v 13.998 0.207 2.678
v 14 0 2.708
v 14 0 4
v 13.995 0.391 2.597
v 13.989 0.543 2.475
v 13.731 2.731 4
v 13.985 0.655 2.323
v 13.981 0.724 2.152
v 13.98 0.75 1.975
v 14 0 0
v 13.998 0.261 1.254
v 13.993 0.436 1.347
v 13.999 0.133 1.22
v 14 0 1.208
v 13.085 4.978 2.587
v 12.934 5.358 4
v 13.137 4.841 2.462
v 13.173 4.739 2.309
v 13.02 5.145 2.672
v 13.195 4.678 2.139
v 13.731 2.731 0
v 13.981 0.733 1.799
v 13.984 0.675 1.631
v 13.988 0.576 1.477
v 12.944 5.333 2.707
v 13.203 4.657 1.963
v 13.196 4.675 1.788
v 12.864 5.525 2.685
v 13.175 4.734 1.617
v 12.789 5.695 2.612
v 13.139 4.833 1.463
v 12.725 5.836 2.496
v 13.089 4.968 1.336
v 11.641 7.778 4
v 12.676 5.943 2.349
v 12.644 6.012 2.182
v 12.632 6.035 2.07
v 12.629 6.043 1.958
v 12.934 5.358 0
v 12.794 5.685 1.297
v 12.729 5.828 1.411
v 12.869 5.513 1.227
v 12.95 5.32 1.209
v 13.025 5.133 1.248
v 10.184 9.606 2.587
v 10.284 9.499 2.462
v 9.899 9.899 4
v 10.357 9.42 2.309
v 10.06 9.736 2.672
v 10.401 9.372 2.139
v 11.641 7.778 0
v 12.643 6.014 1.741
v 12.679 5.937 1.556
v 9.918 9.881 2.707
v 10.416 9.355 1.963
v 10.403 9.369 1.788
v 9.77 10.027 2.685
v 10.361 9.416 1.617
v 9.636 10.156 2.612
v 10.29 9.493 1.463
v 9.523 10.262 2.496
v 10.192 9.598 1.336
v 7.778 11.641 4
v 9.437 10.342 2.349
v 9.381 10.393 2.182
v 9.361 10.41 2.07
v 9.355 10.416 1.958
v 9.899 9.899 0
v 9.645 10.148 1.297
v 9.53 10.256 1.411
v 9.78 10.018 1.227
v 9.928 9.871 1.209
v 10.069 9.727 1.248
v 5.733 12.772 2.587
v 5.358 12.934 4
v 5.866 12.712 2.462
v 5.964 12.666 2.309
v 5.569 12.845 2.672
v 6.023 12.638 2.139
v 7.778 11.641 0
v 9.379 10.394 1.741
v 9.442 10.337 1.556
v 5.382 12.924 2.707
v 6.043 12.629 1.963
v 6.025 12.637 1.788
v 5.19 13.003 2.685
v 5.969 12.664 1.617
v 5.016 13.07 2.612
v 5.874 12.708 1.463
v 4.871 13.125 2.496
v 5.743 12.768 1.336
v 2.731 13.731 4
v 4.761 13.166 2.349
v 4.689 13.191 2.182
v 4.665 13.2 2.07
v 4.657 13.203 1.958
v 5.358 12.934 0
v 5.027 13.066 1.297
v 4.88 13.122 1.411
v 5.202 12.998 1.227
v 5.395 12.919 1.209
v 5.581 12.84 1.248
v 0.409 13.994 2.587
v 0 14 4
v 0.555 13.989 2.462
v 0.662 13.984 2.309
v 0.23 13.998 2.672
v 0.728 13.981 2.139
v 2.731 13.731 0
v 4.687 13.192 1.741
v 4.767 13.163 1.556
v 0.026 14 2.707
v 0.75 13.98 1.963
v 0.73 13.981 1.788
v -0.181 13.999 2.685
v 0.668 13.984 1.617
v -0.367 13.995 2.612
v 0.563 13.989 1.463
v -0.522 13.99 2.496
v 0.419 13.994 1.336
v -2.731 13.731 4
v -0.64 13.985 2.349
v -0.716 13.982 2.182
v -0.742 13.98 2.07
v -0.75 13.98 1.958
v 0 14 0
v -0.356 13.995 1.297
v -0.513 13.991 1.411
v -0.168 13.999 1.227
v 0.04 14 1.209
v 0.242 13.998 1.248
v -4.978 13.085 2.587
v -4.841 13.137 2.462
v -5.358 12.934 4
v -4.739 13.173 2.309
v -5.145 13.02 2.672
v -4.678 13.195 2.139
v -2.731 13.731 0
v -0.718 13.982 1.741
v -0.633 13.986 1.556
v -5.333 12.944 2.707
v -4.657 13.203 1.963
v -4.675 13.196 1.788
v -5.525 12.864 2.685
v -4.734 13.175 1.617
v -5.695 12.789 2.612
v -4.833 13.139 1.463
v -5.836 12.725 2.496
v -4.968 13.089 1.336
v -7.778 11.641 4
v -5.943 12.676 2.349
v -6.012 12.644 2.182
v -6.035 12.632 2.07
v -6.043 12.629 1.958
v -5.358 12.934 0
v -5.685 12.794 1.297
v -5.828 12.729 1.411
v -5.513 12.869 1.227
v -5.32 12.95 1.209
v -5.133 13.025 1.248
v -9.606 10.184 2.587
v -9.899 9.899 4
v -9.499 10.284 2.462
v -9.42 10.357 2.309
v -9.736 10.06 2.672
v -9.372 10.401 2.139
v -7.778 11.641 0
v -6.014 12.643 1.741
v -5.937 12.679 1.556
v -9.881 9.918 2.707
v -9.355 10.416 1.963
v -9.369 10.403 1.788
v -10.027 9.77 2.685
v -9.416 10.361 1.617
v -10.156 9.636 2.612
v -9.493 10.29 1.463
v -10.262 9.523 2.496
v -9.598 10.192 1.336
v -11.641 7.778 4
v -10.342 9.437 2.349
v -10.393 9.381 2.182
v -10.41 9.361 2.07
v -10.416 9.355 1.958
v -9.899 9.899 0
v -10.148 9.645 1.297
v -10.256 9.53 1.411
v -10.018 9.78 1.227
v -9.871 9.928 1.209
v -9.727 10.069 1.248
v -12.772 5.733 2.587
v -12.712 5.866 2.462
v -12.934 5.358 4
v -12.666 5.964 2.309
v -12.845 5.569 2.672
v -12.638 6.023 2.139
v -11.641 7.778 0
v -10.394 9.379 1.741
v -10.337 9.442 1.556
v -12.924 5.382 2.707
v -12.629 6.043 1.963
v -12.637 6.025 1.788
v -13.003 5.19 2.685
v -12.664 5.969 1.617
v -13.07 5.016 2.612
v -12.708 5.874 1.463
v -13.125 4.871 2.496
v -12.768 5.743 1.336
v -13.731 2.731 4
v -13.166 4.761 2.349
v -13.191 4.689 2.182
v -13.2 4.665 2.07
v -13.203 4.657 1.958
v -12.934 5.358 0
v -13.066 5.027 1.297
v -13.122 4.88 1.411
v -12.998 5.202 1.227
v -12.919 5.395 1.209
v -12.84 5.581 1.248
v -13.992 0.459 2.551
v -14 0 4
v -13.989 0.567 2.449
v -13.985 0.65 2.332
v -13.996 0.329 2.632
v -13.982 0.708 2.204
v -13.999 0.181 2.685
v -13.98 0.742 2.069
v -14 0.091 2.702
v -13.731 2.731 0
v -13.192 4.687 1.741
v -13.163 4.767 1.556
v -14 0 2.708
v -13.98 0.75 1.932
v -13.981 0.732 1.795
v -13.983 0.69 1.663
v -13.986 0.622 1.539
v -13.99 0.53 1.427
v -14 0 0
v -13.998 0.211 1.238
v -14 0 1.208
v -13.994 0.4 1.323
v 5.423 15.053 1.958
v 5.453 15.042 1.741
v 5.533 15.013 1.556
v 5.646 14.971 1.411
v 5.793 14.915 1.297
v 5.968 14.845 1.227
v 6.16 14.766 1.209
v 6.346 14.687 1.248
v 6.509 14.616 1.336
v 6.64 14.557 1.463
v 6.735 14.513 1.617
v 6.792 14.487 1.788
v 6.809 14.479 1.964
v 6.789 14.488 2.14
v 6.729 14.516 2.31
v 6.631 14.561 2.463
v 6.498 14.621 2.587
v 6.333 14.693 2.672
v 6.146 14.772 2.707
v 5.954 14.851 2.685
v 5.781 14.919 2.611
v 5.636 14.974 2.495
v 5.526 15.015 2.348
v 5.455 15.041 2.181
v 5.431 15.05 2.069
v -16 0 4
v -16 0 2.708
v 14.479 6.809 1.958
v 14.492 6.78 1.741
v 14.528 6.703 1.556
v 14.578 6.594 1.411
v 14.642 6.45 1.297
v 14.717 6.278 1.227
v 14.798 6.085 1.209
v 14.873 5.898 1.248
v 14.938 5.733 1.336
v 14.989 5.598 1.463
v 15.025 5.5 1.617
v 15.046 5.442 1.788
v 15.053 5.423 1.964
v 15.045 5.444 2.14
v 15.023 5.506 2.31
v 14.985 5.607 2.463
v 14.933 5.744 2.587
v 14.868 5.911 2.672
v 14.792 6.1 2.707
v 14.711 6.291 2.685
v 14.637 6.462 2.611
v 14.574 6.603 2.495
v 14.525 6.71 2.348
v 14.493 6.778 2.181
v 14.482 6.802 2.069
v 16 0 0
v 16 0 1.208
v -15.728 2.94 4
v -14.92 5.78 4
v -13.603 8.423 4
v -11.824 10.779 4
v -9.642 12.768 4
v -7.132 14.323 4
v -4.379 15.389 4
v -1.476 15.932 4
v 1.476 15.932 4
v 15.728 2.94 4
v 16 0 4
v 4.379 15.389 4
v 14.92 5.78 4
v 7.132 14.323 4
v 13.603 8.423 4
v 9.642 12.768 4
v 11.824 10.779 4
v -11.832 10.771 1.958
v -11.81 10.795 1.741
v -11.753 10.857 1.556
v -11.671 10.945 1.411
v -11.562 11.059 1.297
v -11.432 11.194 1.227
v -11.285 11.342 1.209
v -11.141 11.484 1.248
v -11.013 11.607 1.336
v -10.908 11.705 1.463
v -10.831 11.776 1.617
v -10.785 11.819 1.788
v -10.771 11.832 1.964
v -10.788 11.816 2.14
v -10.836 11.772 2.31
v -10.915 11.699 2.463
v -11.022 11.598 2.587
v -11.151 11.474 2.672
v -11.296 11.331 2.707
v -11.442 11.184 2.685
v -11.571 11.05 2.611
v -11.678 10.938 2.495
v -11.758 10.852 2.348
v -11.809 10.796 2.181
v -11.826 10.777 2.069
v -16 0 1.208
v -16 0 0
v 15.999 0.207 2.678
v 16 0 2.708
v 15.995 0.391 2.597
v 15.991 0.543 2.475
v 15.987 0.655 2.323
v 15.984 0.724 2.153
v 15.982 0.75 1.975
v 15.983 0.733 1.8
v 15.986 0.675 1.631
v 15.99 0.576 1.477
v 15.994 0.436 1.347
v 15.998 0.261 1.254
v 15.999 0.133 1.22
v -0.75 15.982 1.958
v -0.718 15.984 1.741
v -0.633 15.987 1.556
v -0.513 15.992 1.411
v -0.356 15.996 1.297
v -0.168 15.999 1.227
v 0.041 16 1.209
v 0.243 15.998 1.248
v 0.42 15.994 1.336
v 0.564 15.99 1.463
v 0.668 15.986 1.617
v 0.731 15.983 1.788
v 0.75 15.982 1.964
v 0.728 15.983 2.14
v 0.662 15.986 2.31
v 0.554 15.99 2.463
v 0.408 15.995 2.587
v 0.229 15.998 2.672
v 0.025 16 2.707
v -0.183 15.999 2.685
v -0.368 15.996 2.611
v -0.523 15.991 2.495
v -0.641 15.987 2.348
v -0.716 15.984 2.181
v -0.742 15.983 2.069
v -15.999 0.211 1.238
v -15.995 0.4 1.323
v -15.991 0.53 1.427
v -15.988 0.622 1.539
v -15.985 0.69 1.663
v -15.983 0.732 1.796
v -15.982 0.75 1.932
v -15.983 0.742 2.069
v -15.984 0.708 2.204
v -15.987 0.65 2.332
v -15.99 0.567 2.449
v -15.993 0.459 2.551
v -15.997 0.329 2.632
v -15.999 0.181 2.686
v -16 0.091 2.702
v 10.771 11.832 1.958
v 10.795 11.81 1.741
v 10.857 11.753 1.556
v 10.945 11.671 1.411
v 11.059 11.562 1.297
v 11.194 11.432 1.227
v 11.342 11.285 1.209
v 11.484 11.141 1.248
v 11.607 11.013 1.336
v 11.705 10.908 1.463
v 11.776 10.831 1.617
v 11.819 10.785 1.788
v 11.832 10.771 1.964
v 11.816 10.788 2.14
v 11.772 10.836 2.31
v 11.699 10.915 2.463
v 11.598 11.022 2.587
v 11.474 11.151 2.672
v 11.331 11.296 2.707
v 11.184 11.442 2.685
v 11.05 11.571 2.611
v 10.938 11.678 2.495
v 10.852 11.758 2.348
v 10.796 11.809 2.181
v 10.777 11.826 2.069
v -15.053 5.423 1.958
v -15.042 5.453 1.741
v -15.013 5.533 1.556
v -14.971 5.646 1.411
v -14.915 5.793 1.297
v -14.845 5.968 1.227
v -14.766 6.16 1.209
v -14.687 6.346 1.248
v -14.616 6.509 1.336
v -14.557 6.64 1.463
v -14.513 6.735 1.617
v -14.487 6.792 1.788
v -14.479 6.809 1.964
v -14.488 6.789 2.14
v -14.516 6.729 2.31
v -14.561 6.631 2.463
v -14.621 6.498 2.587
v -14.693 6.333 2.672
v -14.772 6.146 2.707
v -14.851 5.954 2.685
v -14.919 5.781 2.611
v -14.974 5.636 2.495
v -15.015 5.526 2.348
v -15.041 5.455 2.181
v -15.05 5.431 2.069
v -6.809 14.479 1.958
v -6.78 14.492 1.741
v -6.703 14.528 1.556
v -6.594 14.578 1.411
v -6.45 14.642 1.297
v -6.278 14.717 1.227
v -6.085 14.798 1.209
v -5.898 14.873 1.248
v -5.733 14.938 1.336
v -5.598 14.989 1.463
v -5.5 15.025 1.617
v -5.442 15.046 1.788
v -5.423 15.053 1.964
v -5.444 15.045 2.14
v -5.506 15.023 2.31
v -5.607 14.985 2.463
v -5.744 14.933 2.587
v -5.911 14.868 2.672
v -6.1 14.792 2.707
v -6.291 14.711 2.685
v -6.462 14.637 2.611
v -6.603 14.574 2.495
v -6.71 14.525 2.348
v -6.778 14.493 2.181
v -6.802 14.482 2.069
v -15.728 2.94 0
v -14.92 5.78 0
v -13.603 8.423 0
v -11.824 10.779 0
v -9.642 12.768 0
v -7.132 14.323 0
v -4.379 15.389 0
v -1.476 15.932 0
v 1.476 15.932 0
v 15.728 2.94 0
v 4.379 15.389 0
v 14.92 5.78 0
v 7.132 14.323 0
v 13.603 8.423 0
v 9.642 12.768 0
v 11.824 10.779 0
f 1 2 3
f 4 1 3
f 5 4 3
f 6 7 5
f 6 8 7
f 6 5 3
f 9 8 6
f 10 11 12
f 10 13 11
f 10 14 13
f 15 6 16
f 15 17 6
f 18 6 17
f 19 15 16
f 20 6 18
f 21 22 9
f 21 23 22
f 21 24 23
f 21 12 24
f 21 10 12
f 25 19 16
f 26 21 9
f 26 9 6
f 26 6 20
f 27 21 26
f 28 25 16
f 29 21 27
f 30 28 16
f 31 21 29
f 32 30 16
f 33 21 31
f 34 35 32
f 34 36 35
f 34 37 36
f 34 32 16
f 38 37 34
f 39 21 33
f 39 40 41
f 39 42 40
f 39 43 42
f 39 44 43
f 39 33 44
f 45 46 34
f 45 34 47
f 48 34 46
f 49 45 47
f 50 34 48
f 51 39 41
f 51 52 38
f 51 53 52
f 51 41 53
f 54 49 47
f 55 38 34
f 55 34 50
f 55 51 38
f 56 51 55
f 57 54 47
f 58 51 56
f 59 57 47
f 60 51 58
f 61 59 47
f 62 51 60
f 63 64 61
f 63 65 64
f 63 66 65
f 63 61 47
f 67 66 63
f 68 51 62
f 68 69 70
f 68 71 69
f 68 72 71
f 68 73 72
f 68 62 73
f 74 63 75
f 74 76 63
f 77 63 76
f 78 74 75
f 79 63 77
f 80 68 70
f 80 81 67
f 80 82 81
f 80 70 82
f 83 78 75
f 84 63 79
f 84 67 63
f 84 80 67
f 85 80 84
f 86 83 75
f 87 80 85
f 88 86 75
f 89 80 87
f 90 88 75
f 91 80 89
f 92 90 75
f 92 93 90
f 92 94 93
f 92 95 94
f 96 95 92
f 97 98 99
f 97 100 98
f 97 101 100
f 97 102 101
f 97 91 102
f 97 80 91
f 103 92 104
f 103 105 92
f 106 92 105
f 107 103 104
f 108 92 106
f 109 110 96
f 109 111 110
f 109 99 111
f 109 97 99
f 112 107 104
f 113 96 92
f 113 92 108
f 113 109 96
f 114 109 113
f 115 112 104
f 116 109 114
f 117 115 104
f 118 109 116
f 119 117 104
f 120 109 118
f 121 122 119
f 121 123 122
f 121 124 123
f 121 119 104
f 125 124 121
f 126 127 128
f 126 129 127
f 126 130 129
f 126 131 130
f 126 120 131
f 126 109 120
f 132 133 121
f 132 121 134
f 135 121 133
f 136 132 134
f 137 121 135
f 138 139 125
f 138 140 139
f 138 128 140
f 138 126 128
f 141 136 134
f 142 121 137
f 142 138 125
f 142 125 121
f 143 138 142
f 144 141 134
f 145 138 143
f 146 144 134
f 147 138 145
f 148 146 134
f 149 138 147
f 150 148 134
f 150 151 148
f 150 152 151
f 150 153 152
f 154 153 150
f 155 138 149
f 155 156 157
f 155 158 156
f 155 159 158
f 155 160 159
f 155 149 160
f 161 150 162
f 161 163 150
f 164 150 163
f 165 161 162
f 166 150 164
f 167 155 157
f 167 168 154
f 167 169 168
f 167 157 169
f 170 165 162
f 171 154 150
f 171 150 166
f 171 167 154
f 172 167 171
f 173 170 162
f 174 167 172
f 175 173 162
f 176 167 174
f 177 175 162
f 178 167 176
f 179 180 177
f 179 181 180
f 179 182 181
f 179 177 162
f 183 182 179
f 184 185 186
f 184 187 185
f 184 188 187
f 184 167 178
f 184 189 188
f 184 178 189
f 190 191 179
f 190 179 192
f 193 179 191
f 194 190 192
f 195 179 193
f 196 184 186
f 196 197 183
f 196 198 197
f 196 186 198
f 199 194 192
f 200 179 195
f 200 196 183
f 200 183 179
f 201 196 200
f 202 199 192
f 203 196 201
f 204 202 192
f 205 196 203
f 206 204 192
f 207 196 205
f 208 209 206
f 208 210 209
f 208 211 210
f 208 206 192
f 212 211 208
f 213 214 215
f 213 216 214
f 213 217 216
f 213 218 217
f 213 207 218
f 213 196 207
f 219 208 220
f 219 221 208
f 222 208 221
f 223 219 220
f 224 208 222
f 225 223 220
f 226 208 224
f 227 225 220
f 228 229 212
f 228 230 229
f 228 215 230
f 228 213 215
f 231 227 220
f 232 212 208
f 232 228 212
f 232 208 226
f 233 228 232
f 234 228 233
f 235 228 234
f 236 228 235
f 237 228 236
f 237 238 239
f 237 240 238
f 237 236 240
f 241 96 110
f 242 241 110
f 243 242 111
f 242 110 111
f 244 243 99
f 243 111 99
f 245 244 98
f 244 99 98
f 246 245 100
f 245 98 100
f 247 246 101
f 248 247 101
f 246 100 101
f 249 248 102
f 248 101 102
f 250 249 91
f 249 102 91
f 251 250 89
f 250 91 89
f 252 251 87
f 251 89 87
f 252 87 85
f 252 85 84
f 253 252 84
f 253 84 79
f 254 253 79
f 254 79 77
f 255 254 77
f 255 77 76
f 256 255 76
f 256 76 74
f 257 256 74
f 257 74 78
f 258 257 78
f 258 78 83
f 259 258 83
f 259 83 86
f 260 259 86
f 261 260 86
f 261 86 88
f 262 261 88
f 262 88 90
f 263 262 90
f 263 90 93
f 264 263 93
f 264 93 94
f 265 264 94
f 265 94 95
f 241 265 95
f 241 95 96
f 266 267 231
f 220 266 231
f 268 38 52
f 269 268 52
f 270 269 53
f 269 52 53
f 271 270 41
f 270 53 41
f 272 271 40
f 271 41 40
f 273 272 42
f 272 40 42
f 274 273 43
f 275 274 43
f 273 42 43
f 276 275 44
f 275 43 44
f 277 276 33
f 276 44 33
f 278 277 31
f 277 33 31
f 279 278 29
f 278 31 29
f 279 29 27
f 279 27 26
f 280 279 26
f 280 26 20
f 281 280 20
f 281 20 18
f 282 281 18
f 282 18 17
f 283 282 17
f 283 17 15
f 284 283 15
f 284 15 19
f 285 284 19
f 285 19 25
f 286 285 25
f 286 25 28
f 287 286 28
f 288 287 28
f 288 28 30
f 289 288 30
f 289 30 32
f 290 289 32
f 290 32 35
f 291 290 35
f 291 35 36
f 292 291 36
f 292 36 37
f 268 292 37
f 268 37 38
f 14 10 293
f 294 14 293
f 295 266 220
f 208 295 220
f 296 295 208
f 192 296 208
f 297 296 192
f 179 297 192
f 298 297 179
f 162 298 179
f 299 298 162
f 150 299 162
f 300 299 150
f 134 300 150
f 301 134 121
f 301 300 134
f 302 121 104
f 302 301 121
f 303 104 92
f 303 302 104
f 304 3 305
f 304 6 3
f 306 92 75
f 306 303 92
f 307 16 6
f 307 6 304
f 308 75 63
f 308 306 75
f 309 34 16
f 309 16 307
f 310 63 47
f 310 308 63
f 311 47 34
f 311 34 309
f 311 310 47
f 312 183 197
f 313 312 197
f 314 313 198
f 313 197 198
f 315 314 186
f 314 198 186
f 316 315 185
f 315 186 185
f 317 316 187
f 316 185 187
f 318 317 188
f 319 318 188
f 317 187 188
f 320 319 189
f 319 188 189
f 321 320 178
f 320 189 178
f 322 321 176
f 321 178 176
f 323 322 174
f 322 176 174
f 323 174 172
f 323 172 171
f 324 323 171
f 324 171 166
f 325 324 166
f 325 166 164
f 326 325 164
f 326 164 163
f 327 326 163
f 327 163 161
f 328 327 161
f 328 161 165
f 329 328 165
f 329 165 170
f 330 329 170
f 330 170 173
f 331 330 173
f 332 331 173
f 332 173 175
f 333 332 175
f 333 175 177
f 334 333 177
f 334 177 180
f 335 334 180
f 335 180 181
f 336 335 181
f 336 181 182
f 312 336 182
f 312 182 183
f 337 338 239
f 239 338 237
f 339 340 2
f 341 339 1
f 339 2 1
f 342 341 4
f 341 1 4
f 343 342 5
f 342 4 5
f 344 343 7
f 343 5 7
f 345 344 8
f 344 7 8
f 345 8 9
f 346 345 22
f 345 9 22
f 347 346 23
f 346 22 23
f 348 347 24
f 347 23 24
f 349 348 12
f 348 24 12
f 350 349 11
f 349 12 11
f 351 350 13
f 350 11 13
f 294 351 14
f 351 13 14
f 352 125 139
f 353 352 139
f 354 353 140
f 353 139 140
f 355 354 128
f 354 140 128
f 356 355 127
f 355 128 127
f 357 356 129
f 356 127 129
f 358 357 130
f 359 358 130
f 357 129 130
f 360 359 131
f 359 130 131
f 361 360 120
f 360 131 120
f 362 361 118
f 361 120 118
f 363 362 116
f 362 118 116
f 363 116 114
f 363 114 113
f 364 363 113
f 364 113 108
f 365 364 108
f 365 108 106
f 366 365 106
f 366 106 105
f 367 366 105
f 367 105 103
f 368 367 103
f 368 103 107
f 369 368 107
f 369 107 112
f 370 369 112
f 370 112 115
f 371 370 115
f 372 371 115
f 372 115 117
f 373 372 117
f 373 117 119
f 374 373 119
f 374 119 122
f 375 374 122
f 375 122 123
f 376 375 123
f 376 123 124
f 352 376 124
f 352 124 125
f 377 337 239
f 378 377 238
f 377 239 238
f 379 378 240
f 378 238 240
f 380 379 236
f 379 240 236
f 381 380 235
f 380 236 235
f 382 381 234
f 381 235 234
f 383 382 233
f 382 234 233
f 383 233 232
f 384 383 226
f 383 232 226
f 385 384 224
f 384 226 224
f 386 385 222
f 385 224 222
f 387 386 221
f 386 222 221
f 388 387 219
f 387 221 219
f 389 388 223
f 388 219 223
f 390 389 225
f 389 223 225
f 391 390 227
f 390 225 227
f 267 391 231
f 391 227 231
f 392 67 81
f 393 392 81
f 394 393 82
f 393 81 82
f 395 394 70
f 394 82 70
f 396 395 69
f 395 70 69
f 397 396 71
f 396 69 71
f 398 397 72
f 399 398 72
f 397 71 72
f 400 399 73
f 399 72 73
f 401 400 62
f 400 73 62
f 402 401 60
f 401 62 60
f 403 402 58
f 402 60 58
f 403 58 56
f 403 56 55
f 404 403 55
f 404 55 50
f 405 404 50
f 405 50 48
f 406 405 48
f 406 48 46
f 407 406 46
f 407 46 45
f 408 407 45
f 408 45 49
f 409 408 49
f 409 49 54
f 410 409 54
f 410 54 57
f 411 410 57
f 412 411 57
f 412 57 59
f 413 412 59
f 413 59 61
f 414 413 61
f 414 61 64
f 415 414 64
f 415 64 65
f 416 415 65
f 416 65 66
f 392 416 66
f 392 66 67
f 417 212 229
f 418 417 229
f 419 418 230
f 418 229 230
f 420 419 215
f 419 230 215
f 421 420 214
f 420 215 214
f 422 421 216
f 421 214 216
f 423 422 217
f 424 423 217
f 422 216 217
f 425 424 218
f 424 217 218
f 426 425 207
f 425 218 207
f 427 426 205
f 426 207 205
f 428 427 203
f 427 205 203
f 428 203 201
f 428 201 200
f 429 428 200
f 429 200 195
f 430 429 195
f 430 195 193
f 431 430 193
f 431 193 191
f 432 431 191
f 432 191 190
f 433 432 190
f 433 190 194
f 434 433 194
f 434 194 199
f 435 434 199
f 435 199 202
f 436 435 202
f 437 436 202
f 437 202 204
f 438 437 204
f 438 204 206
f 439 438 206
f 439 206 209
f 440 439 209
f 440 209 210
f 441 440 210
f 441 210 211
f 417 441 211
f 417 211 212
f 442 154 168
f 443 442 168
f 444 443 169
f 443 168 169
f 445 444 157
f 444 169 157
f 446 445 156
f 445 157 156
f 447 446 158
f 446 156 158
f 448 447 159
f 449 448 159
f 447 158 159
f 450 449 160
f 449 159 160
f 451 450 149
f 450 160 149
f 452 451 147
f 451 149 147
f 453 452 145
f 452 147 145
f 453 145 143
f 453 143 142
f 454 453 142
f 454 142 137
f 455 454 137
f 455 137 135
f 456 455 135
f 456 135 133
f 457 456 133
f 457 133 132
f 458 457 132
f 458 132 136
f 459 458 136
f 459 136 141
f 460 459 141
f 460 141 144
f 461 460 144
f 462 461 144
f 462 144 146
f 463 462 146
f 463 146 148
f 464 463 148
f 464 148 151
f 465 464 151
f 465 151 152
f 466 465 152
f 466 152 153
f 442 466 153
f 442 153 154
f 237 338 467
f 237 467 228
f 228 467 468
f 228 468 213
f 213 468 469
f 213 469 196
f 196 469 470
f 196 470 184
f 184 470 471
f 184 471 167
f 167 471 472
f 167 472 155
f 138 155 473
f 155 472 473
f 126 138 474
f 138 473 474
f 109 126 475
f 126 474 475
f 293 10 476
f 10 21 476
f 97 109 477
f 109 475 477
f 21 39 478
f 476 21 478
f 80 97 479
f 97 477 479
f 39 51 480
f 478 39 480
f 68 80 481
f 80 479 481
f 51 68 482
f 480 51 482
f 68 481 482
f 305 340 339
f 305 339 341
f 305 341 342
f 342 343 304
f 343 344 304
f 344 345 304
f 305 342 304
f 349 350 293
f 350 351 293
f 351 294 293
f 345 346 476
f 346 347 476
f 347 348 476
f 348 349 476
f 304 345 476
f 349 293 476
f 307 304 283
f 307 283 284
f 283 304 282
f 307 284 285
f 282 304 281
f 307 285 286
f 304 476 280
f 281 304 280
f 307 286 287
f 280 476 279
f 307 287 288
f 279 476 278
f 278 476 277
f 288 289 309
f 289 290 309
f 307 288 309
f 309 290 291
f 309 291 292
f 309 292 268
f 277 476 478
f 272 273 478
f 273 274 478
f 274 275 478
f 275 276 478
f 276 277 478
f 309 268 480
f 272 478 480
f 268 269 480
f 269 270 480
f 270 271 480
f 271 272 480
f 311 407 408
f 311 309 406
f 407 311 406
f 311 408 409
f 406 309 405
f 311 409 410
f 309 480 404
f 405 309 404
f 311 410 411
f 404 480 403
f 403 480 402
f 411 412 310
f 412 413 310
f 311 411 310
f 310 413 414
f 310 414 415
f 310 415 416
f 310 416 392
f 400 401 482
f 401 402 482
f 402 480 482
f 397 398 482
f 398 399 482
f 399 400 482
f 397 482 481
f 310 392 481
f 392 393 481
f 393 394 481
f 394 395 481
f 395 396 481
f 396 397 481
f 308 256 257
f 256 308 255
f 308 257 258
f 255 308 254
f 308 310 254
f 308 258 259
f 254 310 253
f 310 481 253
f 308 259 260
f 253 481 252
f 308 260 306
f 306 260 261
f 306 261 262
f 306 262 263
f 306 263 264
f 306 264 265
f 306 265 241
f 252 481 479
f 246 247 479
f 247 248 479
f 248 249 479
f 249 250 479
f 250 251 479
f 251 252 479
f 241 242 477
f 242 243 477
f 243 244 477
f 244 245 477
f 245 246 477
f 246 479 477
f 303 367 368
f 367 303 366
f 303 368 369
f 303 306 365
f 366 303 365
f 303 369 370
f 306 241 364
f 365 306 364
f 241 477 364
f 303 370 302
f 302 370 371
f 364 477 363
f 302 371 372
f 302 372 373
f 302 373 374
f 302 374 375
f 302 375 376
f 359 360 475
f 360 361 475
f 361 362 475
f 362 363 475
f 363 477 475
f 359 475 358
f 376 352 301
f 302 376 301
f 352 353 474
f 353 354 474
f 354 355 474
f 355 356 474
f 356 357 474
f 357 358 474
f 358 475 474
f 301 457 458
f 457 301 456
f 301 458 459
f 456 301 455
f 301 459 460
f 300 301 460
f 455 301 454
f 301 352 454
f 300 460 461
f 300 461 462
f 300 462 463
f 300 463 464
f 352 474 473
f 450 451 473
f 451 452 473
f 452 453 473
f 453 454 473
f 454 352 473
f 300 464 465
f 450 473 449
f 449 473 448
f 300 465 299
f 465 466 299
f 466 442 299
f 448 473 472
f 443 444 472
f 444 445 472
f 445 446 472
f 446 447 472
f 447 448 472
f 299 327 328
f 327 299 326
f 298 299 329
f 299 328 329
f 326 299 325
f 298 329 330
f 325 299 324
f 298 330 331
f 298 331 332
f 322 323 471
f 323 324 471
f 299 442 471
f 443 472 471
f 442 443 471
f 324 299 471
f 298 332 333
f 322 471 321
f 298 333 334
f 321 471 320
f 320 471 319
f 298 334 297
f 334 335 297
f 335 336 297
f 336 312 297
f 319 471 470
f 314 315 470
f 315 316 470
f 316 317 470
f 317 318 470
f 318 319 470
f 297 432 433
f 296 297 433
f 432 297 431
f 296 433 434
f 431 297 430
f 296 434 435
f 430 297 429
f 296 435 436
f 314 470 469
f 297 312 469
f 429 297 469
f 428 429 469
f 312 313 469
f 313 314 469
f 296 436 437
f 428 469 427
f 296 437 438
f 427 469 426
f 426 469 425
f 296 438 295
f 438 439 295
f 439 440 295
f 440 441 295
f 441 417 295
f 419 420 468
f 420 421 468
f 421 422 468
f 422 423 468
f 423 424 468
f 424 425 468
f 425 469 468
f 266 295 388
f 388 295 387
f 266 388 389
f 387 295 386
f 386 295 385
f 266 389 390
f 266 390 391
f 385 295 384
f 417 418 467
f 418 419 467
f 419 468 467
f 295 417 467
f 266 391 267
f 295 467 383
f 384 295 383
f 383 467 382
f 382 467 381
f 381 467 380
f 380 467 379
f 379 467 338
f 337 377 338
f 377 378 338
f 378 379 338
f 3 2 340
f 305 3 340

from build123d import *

# Parameters (mm, degrees)
SKETCH_1_R               = 16
SKETCH_1_R_2             = 14
EXTRUDE_1_DEPTH          = 4
SKETCH_2_R               = 0.75
CUT_EXTRUDE_1_DEPTH      = 17
PATTERN_CIRCULAR_1_COUNT = 16
SKETCH_3_W               = 36.79853237
SKETCH_3_H               = 11.94610836
CUT_EXTRUDE_2_DEPTH      = 17.0000001


with BuildPart() as part:
    # ｽｹｯﾁ1 → ﾎﾞｽ - 押し出し1 (new body)
    with BuildSketch(Plane.XY):
        Circle(SKETCH_1_R)
        Circle(SKETCH_1_R_2, mode=Mode.SUBTRACT)
    extrude(amount=EXTRUDE_1_DEPTH)

    # ｽｹｯﾁ2 → ｶｯﾄ - 押し出し1 (cut, through all)
    with BuildSketch(Plane(origin=(0, 0, 0), x_dir=(1, 0, 0), z_dir=(0, 1, 0))):
        with Locations((0, -1.957637914)):
            Circle(SKETCH_2_R)
    cut_extrude_1 = extrude(amount=-CUT_EXTRUDE_1_DEPTH, mode=Mode.SUBTRACT)

    # 円形ﾊﾟﾀｰﾝ1: ｶｯﾄ - 押し出し1 ×16 about axis
    pattern_circular_1_axis = Axis((0, 0, 0), (0, 0, 1))
    for i in range(1, PATTERN_CIRCULAR_1_COUNT):
        add(cut_extrude_1.rotate(pattern_circular_1_axis, i * 360 / PATTERN_CIRCULAR_1_COUNT), mode=Mode.SUBTRACT)

    # ｽｹｯﾁ3 → ｶｯﾄ - 押し出し2 (cut, through all)
    with BuildSketch(Plane(origin=(0, 0, 0), x_dir=(1, 0, 0), z_dir=(0, 1, 0))):
        with Locations((0, -2.028241391)):
            Rectangle(SKETCH_3_W, SKETCH_3_H)
    extrude(amount=-CUT_EXTRUDE_2_DEPTH, mode=Mode.SUBTRACT)


solid = part.part
